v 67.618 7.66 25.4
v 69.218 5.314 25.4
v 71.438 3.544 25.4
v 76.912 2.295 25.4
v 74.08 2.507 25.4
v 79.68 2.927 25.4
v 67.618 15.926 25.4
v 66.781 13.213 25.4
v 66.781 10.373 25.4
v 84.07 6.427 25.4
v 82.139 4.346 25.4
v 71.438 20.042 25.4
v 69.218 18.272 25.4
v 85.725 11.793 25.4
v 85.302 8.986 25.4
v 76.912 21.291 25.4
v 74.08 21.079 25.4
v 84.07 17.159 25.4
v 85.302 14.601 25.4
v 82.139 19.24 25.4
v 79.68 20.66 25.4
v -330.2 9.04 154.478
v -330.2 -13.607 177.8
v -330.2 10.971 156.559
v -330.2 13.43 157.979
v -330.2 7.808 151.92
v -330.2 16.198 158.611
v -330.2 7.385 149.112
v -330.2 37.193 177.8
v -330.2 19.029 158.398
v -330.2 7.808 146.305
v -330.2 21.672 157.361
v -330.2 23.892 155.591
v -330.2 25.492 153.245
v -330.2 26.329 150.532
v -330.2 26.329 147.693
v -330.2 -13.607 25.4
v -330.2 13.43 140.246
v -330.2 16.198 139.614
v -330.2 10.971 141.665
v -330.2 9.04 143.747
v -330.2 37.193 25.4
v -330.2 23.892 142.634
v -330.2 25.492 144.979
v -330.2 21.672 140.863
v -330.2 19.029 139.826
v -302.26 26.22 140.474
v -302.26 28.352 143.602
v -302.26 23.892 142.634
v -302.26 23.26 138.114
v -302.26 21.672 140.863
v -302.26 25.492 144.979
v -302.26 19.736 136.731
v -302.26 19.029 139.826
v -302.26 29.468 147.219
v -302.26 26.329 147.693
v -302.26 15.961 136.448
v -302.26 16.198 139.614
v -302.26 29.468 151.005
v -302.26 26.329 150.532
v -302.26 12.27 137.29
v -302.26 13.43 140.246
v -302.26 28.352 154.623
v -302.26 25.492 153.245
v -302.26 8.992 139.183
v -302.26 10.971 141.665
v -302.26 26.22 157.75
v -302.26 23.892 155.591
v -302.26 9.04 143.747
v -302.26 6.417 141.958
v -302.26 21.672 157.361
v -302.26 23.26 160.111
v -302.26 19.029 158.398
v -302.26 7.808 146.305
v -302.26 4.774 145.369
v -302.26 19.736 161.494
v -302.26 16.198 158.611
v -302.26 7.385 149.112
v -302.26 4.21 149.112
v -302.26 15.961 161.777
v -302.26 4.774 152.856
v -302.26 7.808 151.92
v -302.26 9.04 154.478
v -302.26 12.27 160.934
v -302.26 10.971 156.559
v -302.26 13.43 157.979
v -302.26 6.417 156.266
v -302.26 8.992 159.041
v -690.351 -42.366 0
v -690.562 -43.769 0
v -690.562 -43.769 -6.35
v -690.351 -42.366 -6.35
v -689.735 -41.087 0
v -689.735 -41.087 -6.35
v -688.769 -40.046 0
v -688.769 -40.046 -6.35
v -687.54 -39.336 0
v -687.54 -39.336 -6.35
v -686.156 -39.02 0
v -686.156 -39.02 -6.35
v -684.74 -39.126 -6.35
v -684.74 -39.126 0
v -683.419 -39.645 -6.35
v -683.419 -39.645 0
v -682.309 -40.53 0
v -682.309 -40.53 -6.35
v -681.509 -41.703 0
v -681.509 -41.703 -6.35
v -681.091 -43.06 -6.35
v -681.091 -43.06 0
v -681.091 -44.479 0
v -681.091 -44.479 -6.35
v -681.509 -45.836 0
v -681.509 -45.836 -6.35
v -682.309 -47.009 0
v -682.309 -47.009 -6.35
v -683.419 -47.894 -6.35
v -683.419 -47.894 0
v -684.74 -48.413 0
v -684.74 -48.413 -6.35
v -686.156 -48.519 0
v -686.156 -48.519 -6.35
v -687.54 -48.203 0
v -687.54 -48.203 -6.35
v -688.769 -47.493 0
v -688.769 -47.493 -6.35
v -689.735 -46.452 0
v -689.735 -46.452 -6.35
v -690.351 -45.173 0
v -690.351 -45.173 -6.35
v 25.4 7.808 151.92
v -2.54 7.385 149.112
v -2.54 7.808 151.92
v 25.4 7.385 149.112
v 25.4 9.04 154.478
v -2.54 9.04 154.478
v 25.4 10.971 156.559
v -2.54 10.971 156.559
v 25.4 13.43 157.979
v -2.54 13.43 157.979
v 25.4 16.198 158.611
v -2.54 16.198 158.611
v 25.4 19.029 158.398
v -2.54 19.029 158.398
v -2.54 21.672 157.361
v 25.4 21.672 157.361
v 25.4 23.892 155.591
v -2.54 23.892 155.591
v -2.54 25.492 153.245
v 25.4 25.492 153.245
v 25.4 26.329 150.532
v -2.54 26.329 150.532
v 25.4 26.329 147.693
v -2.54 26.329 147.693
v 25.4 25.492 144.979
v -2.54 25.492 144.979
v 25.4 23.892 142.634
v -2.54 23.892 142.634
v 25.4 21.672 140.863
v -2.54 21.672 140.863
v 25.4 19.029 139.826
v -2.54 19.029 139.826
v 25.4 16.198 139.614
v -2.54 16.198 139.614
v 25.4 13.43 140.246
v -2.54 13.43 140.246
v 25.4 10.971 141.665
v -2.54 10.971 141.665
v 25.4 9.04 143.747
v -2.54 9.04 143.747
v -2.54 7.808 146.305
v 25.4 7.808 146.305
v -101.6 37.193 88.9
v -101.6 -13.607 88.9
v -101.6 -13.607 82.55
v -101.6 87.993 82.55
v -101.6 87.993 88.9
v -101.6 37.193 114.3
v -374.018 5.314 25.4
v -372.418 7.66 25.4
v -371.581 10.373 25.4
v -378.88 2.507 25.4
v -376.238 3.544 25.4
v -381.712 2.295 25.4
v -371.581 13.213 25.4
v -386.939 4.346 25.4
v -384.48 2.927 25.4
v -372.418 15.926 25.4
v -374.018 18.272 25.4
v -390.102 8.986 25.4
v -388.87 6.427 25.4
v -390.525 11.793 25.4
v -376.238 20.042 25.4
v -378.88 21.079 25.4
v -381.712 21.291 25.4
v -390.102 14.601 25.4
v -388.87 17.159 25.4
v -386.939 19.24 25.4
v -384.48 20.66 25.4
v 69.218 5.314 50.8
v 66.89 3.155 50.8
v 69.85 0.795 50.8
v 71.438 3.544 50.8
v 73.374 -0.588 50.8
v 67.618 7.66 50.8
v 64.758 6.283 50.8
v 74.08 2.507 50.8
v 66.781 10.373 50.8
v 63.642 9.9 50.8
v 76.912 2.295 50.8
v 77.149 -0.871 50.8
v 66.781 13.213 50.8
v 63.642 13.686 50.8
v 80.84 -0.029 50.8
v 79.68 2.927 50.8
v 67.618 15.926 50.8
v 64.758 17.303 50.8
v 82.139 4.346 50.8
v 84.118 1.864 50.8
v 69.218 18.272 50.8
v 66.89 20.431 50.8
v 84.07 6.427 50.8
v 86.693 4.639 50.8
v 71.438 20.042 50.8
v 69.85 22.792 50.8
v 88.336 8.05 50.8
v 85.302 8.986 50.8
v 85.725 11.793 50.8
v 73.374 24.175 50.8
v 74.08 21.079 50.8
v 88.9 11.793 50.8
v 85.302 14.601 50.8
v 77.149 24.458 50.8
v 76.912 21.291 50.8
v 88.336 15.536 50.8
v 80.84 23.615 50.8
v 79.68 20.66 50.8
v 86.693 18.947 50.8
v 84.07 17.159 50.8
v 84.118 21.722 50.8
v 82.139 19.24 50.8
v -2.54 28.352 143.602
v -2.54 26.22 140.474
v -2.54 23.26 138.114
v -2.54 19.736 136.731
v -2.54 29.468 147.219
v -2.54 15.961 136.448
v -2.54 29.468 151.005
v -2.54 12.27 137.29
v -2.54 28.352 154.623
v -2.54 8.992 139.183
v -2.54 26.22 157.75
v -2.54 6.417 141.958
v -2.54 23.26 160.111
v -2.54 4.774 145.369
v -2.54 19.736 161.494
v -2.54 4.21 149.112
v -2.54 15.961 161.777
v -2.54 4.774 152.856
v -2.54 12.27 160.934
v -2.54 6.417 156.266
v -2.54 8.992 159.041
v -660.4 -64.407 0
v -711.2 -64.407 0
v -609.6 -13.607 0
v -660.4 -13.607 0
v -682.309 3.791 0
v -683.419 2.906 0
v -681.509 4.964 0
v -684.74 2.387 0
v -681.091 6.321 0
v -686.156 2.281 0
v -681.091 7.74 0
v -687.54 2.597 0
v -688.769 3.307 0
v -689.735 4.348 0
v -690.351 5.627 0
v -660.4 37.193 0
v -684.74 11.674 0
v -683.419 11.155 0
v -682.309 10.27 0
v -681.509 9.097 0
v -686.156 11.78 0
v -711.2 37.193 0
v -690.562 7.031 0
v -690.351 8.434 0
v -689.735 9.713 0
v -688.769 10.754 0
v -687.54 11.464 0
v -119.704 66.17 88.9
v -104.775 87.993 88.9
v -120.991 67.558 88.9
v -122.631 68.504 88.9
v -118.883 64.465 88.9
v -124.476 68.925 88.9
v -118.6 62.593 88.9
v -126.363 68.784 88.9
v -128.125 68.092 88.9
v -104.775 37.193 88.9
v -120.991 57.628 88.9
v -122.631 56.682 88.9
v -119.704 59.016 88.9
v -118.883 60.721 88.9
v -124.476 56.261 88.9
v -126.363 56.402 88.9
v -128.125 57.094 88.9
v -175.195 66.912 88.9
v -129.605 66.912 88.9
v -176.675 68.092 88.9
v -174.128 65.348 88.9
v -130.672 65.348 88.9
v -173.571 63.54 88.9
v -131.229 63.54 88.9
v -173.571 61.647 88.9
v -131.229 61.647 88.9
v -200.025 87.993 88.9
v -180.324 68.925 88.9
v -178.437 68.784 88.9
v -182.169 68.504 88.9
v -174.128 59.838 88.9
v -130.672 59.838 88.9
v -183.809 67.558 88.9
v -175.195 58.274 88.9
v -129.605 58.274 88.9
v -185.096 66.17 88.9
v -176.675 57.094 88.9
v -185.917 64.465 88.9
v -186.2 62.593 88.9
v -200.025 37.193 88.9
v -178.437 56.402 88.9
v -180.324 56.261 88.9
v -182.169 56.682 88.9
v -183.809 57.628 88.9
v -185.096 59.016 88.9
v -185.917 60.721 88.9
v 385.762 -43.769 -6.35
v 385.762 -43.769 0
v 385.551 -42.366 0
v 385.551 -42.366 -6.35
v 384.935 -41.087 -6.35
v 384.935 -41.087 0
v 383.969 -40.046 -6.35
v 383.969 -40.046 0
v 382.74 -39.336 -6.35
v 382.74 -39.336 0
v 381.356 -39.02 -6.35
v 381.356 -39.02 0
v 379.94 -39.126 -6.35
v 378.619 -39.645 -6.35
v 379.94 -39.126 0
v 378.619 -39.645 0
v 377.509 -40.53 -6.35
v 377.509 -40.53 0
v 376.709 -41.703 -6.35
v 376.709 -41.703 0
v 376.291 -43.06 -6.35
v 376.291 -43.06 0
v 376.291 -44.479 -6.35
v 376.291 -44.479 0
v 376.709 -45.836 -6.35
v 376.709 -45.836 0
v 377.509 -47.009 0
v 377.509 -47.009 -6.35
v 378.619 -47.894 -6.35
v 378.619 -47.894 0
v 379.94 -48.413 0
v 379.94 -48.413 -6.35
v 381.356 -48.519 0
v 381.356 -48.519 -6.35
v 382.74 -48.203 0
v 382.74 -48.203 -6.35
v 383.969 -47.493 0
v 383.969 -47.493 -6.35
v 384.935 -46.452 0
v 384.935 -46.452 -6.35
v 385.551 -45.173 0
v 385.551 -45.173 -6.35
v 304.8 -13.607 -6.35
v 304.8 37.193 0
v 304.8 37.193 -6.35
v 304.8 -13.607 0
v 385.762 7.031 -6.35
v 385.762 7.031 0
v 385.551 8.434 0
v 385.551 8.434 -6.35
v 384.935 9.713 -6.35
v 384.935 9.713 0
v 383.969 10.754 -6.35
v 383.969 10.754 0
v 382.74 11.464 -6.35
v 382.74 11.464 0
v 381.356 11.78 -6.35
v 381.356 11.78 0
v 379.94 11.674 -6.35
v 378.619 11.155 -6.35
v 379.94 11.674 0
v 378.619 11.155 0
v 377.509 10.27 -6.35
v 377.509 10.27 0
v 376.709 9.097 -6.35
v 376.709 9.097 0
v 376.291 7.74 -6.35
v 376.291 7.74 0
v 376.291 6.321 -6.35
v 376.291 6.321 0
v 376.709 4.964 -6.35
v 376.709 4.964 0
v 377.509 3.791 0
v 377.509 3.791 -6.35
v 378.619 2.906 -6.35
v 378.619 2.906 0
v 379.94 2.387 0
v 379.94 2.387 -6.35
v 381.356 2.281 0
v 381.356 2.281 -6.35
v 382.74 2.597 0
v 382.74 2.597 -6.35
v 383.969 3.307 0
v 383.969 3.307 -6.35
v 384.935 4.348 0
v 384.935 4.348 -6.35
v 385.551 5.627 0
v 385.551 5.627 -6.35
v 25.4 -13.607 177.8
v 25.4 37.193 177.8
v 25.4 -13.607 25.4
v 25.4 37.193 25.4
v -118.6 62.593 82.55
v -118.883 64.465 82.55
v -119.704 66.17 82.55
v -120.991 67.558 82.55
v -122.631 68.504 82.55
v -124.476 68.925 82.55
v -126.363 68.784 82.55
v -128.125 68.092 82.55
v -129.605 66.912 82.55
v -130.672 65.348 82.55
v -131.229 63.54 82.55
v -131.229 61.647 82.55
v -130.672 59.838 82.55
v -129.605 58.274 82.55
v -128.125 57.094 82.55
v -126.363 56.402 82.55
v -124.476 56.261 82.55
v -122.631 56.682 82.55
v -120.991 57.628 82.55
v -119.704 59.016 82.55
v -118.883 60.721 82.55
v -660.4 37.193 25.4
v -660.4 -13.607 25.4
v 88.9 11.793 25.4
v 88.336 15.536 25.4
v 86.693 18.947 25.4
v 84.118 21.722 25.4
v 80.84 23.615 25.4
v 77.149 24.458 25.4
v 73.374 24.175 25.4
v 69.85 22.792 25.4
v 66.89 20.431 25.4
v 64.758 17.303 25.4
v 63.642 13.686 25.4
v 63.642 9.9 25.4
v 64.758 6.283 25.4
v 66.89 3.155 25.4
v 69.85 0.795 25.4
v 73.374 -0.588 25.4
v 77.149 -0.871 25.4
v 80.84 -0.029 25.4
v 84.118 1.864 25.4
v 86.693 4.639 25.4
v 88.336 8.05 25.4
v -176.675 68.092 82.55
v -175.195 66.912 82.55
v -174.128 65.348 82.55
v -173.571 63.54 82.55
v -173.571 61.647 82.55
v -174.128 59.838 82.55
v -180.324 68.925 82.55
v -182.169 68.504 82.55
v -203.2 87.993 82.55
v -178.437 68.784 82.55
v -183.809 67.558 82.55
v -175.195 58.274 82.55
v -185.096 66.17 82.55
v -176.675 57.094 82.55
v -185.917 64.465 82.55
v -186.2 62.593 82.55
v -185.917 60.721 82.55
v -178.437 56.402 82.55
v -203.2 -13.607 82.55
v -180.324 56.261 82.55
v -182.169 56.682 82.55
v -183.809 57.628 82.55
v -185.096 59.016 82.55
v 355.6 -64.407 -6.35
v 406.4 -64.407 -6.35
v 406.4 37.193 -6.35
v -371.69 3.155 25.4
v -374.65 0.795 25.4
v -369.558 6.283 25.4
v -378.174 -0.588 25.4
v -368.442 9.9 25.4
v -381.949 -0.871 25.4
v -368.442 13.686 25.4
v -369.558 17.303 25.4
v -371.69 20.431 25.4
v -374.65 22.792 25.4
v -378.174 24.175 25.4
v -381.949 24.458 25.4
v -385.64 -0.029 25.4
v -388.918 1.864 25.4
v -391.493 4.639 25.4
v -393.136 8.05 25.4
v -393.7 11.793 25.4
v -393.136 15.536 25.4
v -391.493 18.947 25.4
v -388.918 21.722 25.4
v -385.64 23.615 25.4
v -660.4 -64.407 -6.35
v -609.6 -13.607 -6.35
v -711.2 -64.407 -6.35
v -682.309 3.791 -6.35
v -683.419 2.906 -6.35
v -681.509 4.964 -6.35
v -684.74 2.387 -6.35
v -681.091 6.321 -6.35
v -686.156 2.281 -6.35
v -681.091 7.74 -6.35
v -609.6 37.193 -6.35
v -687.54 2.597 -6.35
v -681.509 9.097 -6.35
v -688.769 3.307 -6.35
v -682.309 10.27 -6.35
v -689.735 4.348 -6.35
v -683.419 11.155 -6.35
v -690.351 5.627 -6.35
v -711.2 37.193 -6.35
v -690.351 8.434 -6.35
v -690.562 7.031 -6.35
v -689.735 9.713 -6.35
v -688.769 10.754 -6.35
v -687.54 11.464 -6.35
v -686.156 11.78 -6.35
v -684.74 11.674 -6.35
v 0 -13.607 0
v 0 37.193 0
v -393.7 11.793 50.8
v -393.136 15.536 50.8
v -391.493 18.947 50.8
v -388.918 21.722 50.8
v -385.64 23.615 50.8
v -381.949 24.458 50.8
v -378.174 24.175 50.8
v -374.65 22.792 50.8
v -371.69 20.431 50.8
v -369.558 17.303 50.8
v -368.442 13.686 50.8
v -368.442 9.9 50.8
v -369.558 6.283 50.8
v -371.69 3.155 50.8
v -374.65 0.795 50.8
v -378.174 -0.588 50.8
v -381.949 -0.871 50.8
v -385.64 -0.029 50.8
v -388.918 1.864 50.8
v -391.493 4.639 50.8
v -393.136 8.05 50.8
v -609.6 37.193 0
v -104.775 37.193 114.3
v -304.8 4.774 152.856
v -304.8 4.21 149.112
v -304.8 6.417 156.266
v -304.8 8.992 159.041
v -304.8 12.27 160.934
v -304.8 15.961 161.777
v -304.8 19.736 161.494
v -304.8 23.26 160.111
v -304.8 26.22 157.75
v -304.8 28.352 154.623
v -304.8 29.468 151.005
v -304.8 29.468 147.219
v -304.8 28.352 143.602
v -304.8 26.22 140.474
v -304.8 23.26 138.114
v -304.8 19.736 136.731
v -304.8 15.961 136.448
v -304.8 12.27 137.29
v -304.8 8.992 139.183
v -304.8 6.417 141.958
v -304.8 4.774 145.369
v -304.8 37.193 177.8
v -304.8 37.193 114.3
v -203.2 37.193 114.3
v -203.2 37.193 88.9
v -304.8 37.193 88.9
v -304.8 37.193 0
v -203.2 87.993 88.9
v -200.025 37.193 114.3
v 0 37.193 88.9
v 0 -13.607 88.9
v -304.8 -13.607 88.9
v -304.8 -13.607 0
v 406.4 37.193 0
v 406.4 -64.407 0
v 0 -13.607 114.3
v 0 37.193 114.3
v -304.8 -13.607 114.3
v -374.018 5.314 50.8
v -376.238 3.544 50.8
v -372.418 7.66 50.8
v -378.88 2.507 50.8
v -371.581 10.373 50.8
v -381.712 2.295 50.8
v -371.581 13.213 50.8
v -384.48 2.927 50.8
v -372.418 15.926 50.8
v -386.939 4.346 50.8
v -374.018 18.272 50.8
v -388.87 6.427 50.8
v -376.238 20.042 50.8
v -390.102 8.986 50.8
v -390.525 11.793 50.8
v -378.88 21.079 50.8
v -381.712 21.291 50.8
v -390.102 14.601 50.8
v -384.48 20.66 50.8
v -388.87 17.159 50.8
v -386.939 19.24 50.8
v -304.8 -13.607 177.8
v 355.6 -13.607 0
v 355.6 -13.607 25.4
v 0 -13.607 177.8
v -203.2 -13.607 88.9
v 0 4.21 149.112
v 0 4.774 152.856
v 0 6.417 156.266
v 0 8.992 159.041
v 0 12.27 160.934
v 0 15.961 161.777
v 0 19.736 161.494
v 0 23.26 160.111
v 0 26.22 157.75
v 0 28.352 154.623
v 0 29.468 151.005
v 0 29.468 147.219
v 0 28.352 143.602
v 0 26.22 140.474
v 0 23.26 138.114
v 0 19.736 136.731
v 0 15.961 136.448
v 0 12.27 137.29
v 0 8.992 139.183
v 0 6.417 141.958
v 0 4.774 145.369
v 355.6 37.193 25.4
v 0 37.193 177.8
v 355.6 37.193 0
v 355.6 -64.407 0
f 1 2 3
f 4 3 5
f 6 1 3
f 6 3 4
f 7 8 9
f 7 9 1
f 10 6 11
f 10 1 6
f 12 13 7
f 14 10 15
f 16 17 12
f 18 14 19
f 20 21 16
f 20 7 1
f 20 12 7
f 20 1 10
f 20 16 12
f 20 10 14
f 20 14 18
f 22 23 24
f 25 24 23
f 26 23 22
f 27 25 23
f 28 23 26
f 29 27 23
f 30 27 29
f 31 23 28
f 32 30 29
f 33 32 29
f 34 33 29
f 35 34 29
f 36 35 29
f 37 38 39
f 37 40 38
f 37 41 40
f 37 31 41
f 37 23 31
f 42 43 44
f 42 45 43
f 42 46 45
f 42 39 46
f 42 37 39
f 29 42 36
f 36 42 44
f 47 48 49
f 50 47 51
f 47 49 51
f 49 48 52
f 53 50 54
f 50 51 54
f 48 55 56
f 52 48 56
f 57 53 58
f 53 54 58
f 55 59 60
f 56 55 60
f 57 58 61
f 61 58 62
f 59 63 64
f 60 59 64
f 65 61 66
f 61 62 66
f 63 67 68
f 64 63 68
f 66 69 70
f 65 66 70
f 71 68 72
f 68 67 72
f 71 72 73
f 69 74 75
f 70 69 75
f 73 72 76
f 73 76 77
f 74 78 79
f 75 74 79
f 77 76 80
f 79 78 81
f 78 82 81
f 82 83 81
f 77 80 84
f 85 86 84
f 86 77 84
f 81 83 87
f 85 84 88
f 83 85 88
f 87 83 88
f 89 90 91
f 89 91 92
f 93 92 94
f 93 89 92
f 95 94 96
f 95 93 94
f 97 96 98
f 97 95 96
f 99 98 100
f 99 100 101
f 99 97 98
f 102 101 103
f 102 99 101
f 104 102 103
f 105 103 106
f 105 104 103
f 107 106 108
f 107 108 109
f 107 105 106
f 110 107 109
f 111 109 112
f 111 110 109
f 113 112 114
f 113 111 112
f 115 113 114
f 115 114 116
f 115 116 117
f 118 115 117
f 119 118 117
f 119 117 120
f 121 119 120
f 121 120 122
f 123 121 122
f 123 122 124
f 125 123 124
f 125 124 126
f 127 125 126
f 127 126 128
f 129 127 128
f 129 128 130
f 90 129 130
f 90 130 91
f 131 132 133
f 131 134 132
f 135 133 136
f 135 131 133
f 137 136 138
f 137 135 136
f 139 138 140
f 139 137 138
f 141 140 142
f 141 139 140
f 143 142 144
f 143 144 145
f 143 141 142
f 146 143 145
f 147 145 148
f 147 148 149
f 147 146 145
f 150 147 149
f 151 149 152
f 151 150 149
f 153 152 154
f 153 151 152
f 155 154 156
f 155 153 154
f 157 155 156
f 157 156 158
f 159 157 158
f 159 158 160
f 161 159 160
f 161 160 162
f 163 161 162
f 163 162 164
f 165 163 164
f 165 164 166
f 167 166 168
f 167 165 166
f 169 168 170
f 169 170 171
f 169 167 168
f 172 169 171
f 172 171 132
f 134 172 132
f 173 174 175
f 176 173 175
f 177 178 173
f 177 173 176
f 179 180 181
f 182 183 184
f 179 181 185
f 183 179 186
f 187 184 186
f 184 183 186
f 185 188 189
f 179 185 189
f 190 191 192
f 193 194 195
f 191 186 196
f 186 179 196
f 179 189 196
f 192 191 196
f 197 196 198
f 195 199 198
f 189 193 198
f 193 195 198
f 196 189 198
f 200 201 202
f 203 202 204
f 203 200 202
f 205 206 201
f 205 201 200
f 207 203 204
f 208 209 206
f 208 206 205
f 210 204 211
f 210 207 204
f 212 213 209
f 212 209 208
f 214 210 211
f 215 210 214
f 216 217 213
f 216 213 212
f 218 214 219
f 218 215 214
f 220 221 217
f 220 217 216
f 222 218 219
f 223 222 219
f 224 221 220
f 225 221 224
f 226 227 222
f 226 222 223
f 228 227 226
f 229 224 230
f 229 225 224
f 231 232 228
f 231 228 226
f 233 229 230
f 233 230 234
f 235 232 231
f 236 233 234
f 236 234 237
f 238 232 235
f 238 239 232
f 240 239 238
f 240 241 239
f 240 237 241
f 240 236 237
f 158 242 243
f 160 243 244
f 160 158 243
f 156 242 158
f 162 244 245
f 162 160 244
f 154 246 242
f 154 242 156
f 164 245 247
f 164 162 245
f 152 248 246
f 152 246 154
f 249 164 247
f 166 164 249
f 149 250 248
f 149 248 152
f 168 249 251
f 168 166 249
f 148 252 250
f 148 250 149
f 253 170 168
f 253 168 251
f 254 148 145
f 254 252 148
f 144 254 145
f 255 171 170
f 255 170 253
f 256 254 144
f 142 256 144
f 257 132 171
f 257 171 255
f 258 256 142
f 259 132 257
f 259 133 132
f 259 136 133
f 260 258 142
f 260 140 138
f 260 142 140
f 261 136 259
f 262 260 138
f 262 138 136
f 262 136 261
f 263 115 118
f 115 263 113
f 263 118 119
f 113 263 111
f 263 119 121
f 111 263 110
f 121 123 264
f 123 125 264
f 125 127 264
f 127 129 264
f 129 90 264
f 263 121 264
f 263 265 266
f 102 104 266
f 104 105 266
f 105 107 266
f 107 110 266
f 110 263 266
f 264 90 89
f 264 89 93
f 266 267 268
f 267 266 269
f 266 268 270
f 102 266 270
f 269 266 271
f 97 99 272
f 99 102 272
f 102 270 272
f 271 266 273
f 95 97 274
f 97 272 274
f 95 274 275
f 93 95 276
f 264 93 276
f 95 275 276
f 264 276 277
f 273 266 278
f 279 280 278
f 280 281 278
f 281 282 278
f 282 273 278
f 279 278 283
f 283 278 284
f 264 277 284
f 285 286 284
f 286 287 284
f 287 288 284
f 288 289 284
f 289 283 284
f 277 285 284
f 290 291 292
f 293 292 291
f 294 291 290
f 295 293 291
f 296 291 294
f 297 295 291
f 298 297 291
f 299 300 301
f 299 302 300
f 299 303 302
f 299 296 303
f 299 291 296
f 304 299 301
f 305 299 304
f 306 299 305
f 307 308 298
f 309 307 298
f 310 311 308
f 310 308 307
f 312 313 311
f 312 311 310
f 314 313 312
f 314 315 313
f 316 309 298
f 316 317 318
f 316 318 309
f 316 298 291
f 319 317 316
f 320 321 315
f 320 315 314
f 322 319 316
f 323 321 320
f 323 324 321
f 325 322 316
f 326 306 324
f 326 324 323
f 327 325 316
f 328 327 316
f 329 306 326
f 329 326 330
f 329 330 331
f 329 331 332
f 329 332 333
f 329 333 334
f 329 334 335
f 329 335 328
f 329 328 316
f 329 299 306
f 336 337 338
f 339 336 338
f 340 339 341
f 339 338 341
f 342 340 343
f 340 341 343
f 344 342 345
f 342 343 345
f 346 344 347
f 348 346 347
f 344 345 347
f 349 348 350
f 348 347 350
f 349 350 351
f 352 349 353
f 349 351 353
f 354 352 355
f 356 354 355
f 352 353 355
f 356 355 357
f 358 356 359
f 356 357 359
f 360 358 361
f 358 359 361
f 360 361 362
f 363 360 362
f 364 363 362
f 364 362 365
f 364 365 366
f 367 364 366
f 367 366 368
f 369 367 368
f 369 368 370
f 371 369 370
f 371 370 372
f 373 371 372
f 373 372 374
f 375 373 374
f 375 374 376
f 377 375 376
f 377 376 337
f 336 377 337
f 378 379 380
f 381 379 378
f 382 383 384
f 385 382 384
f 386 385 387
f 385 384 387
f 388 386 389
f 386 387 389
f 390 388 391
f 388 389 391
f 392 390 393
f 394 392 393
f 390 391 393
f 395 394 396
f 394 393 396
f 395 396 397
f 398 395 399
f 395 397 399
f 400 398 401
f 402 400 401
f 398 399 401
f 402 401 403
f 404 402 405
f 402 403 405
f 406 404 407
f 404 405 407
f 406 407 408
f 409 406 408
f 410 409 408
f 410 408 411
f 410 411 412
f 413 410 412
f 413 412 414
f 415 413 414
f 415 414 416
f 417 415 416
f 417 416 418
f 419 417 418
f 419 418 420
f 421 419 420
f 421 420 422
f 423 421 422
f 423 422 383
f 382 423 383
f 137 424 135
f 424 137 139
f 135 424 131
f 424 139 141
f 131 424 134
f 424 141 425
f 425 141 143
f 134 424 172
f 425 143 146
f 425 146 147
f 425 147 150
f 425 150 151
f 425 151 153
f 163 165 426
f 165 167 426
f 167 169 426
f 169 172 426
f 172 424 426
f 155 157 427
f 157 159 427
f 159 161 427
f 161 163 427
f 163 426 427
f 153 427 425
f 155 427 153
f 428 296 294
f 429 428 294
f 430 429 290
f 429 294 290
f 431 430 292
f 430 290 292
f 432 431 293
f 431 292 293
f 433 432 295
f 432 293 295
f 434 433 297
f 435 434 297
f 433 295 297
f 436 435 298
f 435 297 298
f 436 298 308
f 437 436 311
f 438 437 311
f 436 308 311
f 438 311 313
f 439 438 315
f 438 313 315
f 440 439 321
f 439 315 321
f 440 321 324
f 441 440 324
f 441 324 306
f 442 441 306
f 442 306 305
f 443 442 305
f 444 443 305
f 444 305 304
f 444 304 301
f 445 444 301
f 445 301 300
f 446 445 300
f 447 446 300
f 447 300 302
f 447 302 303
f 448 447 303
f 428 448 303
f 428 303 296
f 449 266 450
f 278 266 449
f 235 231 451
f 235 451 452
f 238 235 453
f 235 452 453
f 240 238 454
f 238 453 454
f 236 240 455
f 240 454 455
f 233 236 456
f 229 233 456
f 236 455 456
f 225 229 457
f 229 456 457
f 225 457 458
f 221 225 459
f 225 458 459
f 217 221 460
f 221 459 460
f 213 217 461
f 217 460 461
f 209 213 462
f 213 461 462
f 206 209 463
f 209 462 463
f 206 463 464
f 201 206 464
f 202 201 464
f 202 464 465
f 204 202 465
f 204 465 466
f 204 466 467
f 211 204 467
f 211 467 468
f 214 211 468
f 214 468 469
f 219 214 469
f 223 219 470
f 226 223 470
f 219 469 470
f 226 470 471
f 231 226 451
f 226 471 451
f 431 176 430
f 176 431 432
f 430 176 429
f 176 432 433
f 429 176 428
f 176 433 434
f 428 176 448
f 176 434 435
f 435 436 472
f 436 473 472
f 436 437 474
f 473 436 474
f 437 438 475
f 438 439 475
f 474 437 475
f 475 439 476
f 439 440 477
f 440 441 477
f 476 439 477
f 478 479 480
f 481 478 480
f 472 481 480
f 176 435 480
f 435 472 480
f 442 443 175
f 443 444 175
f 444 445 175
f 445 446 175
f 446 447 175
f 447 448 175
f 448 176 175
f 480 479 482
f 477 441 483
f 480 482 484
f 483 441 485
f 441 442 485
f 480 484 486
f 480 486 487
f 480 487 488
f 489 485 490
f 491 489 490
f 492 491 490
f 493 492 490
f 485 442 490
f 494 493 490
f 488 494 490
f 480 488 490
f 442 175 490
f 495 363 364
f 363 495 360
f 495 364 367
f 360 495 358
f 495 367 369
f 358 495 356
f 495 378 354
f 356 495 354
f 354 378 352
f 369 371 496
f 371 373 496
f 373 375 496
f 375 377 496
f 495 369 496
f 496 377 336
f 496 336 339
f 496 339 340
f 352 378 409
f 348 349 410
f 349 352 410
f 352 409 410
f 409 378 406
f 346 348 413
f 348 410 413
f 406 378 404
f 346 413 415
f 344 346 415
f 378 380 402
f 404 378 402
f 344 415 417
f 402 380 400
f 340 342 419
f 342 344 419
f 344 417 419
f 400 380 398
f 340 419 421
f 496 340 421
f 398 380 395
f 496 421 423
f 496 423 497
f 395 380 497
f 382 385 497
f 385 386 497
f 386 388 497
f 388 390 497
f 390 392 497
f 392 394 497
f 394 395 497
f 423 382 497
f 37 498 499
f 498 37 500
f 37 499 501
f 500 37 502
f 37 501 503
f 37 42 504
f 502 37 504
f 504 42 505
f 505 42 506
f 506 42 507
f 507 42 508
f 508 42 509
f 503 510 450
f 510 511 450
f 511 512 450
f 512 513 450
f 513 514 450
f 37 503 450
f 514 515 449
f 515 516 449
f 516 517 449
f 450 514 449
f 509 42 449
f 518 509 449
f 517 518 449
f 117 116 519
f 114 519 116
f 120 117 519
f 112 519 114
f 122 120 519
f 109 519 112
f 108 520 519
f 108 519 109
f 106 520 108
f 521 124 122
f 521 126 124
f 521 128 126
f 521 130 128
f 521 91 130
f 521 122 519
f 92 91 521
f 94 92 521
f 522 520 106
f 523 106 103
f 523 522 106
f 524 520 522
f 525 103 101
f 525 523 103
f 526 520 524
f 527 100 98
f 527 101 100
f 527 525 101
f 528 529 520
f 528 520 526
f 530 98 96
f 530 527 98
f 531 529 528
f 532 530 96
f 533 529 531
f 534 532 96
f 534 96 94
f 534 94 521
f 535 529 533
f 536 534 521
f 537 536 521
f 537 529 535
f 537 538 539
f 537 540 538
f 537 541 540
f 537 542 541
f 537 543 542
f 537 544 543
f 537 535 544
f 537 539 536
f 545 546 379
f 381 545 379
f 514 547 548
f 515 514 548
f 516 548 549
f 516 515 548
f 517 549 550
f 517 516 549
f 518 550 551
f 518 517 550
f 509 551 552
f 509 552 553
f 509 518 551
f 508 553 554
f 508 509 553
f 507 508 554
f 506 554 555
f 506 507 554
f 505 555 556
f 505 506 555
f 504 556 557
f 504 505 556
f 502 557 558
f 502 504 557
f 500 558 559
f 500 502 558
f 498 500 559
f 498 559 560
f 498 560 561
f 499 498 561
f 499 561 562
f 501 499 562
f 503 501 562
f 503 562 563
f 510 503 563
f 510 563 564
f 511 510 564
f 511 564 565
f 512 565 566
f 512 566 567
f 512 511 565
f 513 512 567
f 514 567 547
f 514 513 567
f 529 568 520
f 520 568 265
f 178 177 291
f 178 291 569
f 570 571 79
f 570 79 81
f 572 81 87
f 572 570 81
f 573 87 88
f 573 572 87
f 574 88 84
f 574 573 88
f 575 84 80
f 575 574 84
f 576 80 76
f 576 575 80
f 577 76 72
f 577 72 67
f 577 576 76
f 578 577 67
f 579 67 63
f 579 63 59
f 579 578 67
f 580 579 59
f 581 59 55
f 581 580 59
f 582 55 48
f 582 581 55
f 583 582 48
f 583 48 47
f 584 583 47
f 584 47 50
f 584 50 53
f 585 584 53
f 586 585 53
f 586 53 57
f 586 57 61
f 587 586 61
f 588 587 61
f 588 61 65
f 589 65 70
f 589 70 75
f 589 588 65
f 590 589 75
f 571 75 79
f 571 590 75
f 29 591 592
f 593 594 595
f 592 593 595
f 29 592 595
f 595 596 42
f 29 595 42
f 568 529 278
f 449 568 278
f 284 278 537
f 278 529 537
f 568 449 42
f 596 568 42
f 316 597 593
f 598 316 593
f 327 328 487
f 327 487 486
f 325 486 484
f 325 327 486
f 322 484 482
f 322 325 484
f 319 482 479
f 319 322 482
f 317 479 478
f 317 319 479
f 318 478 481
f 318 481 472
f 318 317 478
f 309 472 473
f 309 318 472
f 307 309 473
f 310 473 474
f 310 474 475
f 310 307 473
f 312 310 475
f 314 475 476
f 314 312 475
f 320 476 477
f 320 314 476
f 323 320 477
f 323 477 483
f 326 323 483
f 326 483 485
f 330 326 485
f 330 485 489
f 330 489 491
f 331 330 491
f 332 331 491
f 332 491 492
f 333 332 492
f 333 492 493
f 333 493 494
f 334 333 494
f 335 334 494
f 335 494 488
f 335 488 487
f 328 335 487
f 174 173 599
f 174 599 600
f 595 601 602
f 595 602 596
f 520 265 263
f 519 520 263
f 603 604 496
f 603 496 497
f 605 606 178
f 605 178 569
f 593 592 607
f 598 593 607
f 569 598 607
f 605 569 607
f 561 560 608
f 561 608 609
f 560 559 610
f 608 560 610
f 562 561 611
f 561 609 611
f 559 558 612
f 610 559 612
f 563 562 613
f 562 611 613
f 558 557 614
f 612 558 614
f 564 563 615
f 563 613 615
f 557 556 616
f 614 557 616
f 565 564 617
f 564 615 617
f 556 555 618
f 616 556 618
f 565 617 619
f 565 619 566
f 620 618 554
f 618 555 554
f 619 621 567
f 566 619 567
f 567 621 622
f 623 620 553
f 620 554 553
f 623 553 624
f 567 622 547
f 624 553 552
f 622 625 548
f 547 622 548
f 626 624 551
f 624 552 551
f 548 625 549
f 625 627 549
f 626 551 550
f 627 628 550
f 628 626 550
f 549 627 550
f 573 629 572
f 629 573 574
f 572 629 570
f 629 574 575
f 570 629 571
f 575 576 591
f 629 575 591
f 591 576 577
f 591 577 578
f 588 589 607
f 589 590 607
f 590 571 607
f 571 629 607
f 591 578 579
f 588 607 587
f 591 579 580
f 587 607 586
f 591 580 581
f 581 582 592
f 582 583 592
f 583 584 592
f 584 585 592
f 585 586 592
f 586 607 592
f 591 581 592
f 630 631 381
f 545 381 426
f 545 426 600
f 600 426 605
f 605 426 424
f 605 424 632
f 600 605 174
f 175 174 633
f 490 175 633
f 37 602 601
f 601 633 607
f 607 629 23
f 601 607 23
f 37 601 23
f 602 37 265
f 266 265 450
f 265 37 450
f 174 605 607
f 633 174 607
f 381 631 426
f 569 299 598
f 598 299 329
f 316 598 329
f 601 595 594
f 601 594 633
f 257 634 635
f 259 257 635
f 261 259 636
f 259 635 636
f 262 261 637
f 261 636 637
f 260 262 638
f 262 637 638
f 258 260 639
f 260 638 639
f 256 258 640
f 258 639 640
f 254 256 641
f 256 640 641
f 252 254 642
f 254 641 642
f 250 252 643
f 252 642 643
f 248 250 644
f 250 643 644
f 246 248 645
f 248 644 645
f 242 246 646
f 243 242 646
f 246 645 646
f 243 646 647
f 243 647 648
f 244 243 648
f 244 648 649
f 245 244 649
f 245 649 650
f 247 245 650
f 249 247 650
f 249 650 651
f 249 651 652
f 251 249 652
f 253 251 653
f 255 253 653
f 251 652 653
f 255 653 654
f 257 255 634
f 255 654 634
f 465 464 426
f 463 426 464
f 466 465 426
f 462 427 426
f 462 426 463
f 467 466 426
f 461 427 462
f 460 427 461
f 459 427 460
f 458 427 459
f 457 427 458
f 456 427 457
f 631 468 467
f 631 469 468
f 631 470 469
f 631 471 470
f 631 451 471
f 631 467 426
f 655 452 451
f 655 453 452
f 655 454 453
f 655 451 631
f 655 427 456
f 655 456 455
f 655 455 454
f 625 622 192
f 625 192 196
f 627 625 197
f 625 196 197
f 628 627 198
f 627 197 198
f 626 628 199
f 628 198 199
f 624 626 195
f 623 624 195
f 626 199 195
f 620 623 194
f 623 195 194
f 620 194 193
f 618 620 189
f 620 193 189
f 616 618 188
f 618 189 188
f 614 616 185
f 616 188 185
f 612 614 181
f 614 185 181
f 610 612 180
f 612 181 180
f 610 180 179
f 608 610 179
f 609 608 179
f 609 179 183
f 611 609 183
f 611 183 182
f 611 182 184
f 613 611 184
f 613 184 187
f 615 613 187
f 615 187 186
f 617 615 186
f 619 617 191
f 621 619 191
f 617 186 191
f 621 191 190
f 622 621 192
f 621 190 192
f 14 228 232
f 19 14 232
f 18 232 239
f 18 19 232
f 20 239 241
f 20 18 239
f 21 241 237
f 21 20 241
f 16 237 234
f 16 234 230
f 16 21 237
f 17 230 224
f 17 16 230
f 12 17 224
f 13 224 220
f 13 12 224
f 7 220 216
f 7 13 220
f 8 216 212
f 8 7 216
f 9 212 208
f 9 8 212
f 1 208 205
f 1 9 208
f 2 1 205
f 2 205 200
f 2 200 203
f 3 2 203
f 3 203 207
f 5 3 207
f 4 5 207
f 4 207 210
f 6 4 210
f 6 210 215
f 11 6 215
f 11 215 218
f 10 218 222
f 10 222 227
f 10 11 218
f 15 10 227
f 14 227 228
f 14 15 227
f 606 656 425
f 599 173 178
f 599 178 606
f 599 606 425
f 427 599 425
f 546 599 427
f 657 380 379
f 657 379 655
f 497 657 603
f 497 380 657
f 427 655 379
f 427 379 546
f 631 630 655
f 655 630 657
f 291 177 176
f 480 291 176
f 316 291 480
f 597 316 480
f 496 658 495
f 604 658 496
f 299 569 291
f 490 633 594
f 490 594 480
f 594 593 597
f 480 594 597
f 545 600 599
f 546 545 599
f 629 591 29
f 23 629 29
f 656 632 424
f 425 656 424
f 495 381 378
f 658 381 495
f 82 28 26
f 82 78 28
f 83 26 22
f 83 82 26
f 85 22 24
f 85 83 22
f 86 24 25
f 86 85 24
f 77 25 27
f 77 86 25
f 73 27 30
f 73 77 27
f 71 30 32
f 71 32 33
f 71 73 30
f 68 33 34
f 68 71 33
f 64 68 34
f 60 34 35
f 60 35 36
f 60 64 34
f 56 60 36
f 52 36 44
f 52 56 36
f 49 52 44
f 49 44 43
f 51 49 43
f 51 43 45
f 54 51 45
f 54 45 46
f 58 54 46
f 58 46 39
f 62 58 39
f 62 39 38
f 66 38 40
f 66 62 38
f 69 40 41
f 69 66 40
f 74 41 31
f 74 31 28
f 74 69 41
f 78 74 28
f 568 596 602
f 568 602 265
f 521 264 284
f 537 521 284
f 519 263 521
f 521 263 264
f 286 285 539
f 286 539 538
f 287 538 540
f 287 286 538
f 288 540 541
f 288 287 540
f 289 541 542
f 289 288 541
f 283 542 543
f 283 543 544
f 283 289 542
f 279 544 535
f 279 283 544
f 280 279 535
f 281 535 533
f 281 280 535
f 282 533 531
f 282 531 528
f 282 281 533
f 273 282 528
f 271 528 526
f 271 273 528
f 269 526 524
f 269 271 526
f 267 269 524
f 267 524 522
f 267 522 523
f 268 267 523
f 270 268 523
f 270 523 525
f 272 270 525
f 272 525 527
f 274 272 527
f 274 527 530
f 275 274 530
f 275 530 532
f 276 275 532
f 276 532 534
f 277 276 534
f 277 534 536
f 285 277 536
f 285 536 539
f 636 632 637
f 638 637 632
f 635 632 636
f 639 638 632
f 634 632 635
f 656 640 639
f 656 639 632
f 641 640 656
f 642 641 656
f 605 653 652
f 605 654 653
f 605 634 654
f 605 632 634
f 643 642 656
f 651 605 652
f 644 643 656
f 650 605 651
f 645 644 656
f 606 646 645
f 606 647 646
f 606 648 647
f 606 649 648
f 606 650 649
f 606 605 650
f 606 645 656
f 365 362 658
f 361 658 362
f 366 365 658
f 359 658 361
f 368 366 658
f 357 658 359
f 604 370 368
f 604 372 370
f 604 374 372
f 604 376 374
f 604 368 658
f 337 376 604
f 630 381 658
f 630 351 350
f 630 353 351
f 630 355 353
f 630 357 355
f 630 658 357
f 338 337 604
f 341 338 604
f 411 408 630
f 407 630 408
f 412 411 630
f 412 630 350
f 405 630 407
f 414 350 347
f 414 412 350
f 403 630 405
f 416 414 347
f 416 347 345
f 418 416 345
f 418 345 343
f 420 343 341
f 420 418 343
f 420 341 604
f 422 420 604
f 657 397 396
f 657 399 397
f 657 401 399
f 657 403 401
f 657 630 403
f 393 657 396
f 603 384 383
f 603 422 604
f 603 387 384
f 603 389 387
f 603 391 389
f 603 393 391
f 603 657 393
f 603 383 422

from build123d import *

# Parameters (mm, degrees)
F0_W      = 355.6
F0_H      = 50.8
F1_DEPTH  = 25.4
F3_DEPTH  = 6.35
F4_R      = 4.7625
F5_DEPTH  = 25.4
F6_R      = 12.7
F6_R_2    = 9.525
F7_DEPTH  = 25.4
F8_W      = 25.4
F8_H      = 50.8
F9_DEPTH  = 152.4
F10_W     = 50.8
F10_H     = 25.4
F11_DEPTH = 152.4
F12_R     = 12.7
F12_R_2   = 9.525
F13_DEPTH = 2.54
F14_R     = 9.525
F15_DEPTH = 25.4
F16_W     = 50.8
F16_H     = 101.6
F17_DEPTH = 6.35
F18_R     = 6.35
F19_DEPTH = 25.4
F20_W     = 50.8
F20_H     = 6.35
F21_DEPTH = 3.175


with BuildPart() as f1:
    # F0 (on Top) → F1 (new body)
    with BuildSketch(Plane.XY):
        with Locations((177.8, 11.79309)):
            Rectangle(F0_W, F0_H)
    extrude(amount=F1_DEPTH)

    # F2 (on Top) → F3 (join)
    with BuildSketch(Plane.XY):
        Polygon((355.6, 37.19309), (304.8, 37.19309), (304.8, -13.60691), (355.6, -64.40691), (406.4, -64.40691), (406.4, 37.19309), align=None)
    extrude(amount=-F3_DEPTH)

    # F4 (on face) → F5 (cut)
    with BuildSketch(Plane.XY):
        with Locations((381, -43.76941)):
            Circle(F4_R)
        with Locations((381, 7.03059)):
            Circle(F4_R)
    extrude(amount=-F5_DEPTH, mode=Mode.SUBTRACT)

    # F6 (on face) → F7 (join)
    with BuildSketch(Plane.XY.offset(25.4)):
        with Locations((76.2, 11.79309)):
            Circle(F6_R)
        with Locations((76.2, 11.79309)):
            Circle(F6_R_2, mode=Mode.SUBTRACT)
    extrude(amount=F7_DEPTH)

    # F8 (on face) → F9 (join)
    with BuildSketch(Plane.XY.offset(25.4)):
        with Locations((12.7, 11.79309)):
            Rectangle(F8_W, F8_H)
    extrude(amount=F9_DEPTH)

    # F10 (on face) → F11 (join)
    with BuildSketch(Plane(origin=(0, 0, 0), x_dir=(0, -1, 0), z_dir=(-1, 0, 0))):
        with Locations((-11.79309, 101.6)):
            Rectangle(F10_W, F10_H)
    extrude(amount=F11_DEPTH)

    # F12 (on face) → F13 (join)
    with BuildSketch(Plane(origin=(0, 0, 0), x_dir=(0, -1, 0), z_dir=(-1, 0, 0))):
        with Locations((-16.909977, 149.112195)):
            Circle(F12_R)
        with Locations((-16.909977, 149.112195)):
            Circle(F12_R_2, mode=Mode.SUBTRACT)
    extrude(amount=F13_DEPTH)

    # F14 (on face) → F15 (cut)
    with BuildSketch(Plane(origin=(0, 0, 0), x_dir=(0, -1, 0), z_dir=(-1, 0, 0))):
        with Locations((-16.909977, 149.112195)):
            Circle(F14_R)
    extrude(amount=-F15_DEPTH, mode=Mode.SUBTRACT)

    # F16 (on face) → F17 (join)
    with BuildSketch(Plane(origin=(0, 0, 88.9), x_dir=(1, 0, 0), z_dir=(0, 0, -1))):
        with Locations((-127, -37.19309)):
            Rectangle(F16_W, F16_H)
    extrude(amount=F17_DEPTH)

    # F18 (on face) → F19 (cut)
    with BuildSketch(Plane.XY.offset(88.9)):
        with Locations((-124.950424, 62.59309)):
            Circle(F18_R)
    extrude(amount=-F19_DEPTH, mode=Mode.SUBTRACT)

    # F20 (on face) → F21 (join)
    with BuildSketch(Plane.YZ.offset(-101.6)):
        Polygon((37.19309, 88.9), (87.99309, 88.9), (37.19309, 114.3), align=None)
        with Locations((62.59309, 85.725)):
            Rectangle(F20_W, F20_H)
    extrude(amount=-F21_DEPTH)

    # F22: F1 across face


with BuildPart() as f1_1:
    add(f1.part)
    add(f1.part.mirror(Plane(origin=(-152.4, 20.259757, 96.308333), x_dir=(0, -1, 0), z_dir=(-1, 0, 0))))


solid = f1_1.part
